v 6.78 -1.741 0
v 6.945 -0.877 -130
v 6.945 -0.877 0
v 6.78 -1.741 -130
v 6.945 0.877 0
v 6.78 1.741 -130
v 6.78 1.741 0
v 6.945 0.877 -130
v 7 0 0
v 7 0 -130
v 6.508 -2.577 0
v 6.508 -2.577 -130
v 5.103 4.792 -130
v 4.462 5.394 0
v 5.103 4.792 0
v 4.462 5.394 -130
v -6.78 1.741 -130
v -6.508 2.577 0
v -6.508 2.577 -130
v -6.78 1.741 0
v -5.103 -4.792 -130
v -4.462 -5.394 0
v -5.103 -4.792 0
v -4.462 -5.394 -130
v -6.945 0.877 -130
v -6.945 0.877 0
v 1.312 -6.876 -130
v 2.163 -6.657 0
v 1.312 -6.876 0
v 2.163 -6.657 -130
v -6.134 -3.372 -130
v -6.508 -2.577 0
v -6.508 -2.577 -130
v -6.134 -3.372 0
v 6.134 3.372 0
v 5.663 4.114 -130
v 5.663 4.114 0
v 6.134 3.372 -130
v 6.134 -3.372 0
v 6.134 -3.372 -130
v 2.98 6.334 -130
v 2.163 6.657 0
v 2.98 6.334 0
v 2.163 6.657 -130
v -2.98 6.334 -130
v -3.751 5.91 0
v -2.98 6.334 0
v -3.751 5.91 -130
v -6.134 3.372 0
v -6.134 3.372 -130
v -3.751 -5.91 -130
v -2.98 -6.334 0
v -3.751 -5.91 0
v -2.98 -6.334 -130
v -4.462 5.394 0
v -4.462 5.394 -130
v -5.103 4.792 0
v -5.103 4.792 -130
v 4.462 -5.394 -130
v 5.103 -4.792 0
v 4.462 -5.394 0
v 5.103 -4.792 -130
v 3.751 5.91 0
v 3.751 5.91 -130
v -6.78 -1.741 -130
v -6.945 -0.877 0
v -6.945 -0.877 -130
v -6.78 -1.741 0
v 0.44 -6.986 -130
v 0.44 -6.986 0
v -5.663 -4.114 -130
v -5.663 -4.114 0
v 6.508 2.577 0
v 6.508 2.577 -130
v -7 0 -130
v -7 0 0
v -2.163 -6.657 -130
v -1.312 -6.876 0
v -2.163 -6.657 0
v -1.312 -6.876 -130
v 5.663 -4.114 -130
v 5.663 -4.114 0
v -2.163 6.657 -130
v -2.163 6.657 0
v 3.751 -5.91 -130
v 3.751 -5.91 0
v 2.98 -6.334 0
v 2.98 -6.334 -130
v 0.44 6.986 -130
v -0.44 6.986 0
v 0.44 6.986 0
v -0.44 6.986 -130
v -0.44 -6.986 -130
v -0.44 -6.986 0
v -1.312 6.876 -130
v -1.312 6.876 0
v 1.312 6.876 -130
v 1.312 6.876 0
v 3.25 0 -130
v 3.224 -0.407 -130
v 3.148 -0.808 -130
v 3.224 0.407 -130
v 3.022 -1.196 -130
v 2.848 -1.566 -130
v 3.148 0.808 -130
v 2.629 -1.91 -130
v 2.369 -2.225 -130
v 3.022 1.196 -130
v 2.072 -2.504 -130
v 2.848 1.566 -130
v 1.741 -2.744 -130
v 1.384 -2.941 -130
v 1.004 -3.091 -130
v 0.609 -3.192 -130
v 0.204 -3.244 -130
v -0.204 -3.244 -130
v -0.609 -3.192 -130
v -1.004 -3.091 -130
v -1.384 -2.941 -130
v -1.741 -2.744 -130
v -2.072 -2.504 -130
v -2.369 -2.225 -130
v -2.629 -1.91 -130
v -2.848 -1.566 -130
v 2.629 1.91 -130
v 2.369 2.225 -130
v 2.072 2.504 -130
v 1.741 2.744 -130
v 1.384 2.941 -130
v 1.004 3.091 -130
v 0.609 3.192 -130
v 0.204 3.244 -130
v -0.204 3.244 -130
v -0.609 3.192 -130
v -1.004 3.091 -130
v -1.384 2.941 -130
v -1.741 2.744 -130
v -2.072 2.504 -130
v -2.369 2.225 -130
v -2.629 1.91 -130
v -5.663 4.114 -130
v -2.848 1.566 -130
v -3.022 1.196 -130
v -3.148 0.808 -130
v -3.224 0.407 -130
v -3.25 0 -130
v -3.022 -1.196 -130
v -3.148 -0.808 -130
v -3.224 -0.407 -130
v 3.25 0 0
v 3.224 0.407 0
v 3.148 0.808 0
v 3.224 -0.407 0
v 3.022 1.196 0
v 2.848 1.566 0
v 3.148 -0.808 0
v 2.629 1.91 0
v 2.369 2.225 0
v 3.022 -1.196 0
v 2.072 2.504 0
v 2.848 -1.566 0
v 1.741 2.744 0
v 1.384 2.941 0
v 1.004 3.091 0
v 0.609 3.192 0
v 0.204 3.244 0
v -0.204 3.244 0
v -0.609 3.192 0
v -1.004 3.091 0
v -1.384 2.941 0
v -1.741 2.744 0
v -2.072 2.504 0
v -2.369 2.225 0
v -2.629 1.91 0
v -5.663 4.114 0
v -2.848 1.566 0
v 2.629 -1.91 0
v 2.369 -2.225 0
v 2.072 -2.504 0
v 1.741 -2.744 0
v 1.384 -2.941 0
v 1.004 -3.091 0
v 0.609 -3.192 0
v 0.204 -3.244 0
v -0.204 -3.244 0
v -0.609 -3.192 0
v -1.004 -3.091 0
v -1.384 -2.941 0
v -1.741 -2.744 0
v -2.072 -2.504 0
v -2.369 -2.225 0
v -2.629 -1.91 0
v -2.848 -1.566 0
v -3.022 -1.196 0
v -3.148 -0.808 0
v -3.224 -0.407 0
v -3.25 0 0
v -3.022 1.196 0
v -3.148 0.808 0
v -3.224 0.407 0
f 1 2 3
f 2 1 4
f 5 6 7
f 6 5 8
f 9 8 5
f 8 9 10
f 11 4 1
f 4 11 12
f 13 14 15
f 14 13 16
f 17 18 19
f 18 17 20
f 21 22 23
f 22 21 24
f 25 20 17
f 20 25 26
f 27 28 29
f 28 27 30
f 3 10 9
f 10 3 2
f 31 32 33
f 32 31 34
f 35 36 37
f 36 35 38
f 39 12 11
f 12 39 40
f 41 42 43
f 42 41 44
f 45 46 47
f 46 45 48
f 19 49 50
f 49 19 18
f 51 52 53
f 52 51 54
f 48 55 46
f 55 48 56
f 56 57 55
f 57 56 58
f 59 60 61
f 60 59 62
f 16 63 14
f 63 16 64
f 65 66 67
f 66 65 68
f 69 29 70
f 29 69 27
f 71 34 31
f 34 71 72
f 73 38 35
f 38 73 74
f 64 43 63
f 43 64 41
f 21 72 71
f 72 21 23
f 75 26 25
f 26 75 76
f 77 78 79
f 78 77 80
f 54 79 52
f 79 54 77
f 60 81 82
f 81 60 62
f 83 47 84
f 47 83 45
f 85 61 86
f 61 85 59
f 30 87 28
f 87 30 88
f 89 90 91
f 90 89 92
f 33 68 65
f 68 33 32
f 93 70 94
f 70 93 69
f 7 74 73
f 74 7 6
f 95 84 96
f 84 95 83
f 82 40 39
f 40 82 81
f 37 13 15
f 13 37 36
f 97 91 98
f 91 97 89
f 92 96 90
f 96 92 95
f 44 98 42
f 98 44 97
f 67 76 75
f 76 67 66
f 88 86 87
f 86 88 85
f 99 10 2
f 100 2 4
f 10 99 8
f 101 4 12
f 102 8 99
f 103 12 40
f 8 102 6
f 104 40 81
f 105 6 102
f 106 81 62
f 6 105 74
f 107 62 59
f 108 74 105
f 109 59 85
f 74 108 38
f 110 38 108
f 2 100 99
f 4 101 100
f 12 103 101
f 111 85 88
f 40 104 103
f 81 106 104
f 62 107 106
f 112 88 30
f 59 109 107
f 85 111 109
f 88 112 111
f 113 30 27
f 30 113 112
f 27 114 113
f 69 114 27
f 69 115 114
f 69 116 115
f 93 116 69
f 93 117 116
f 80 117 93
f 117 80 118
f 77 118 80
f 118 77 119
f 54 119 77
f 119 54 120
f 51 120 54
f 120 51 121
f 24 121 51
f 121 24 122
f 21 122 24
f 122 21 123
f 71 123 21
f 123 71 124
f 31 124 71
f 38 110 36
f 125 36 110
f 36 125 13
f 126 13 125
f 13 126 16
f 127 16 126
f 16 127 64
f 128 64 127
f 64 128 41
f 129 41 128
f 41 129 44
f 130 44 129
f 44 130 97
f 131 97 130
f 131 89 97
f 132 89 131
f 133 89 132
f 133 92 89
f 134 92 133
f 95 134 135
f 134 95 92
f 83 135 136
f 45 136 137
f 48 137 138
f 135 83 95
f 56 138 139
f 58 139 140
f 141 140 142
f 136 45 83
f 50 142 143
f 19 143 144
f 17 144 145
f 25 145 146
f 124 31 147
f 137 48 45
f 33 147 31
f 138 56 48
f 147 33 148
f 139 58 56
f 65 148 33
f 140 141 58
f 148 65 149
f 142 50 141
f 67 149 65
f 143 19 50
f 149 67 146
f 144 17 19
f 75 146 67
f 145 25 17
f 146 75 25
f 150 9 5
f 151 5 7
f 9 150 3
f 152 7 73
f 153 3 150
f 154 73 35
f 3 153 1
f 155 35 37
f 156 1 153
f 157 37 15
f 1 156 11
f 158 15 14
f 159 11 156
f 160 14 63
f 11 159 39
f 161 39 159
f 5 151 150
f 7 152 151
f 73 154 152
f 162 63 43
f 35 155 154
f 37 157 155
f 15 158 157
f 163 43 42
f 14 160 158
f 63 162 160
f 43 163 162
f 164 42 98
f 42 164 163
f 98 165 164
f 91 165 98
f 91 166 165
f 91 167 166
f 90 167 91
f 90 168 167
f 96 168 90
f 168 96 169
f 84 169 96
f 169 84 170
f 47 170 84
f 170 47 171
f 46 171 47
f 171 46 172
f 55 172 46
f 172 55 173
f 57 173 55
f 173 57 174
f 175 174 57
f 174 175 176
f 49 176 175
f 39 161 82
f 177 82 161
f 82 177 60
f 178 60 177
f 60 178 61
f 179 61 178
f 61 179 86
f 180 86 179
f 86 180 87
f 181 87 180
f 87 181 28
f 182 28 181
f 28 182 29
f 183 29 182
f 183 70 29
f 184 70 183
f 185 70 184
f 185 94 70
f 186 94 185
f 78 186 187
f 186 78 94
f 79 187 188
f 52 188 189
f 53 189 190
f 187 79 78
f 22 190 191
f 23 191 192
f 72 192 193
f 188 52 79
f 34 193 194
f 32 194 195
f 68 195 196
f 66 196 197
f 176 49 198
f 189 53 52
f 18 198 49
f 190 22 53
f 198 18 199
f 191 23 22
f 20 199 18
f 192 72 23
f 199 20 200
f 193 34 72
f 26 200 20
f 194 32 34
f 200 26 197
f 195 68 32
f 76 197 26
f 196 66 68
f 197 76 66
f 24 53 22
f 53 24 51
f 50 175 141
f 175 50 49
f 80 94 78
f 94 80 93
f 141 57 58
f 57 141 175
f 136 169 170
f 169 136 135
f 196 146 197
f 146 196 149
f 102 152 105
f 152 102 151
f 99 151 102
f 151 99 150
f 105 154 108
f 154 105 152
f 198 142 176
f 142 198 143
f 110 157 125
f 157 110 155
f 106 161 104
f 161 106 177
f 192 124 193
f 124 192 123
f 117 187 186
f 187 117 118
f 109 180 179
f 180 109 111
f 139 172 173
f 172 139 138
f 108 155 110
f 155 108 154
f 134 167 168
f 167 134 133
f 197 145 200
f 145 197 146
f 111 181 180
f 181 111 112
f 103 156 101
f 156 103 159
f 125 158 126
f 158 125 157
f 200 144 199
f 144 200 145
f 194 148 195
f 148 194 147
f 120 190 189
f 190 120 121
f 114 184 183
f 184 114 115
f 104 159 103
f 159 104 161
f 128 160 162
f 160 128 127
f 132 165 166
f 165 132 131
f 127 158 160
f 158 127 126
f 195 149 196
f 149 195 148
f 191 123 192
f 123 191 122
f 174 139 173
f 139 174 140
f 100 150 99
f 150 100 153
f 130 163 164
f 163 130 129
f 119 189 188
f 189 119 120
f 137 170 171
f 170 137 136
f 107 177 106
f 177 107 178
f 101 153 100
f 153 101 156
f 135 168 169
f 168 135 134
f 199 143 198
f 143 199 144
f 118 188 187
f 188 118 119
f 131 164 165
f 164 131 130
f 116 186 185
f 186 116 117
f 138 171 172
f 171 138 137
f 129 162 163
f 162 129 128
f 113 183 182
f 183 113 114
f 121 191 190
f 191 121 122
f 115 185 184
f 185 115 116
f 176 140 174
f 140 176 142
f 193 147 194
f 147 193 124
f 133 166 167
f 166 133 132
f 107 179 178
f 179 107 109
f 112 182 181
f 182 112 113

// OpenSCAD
$fn = 50;


difference() {
	union() {
		translate(v = [0, 0, -130.0000000000]) {
			cylinder(h = 130, r = 7.0000000000);
		}
		cylinder(h = 0, r = 10.0000000000);
	}
	union() {
		#translate(v = [0, 0, -130]) {
			cylinder(h = 130, r = 3.2500000000);
		}
	}
}
